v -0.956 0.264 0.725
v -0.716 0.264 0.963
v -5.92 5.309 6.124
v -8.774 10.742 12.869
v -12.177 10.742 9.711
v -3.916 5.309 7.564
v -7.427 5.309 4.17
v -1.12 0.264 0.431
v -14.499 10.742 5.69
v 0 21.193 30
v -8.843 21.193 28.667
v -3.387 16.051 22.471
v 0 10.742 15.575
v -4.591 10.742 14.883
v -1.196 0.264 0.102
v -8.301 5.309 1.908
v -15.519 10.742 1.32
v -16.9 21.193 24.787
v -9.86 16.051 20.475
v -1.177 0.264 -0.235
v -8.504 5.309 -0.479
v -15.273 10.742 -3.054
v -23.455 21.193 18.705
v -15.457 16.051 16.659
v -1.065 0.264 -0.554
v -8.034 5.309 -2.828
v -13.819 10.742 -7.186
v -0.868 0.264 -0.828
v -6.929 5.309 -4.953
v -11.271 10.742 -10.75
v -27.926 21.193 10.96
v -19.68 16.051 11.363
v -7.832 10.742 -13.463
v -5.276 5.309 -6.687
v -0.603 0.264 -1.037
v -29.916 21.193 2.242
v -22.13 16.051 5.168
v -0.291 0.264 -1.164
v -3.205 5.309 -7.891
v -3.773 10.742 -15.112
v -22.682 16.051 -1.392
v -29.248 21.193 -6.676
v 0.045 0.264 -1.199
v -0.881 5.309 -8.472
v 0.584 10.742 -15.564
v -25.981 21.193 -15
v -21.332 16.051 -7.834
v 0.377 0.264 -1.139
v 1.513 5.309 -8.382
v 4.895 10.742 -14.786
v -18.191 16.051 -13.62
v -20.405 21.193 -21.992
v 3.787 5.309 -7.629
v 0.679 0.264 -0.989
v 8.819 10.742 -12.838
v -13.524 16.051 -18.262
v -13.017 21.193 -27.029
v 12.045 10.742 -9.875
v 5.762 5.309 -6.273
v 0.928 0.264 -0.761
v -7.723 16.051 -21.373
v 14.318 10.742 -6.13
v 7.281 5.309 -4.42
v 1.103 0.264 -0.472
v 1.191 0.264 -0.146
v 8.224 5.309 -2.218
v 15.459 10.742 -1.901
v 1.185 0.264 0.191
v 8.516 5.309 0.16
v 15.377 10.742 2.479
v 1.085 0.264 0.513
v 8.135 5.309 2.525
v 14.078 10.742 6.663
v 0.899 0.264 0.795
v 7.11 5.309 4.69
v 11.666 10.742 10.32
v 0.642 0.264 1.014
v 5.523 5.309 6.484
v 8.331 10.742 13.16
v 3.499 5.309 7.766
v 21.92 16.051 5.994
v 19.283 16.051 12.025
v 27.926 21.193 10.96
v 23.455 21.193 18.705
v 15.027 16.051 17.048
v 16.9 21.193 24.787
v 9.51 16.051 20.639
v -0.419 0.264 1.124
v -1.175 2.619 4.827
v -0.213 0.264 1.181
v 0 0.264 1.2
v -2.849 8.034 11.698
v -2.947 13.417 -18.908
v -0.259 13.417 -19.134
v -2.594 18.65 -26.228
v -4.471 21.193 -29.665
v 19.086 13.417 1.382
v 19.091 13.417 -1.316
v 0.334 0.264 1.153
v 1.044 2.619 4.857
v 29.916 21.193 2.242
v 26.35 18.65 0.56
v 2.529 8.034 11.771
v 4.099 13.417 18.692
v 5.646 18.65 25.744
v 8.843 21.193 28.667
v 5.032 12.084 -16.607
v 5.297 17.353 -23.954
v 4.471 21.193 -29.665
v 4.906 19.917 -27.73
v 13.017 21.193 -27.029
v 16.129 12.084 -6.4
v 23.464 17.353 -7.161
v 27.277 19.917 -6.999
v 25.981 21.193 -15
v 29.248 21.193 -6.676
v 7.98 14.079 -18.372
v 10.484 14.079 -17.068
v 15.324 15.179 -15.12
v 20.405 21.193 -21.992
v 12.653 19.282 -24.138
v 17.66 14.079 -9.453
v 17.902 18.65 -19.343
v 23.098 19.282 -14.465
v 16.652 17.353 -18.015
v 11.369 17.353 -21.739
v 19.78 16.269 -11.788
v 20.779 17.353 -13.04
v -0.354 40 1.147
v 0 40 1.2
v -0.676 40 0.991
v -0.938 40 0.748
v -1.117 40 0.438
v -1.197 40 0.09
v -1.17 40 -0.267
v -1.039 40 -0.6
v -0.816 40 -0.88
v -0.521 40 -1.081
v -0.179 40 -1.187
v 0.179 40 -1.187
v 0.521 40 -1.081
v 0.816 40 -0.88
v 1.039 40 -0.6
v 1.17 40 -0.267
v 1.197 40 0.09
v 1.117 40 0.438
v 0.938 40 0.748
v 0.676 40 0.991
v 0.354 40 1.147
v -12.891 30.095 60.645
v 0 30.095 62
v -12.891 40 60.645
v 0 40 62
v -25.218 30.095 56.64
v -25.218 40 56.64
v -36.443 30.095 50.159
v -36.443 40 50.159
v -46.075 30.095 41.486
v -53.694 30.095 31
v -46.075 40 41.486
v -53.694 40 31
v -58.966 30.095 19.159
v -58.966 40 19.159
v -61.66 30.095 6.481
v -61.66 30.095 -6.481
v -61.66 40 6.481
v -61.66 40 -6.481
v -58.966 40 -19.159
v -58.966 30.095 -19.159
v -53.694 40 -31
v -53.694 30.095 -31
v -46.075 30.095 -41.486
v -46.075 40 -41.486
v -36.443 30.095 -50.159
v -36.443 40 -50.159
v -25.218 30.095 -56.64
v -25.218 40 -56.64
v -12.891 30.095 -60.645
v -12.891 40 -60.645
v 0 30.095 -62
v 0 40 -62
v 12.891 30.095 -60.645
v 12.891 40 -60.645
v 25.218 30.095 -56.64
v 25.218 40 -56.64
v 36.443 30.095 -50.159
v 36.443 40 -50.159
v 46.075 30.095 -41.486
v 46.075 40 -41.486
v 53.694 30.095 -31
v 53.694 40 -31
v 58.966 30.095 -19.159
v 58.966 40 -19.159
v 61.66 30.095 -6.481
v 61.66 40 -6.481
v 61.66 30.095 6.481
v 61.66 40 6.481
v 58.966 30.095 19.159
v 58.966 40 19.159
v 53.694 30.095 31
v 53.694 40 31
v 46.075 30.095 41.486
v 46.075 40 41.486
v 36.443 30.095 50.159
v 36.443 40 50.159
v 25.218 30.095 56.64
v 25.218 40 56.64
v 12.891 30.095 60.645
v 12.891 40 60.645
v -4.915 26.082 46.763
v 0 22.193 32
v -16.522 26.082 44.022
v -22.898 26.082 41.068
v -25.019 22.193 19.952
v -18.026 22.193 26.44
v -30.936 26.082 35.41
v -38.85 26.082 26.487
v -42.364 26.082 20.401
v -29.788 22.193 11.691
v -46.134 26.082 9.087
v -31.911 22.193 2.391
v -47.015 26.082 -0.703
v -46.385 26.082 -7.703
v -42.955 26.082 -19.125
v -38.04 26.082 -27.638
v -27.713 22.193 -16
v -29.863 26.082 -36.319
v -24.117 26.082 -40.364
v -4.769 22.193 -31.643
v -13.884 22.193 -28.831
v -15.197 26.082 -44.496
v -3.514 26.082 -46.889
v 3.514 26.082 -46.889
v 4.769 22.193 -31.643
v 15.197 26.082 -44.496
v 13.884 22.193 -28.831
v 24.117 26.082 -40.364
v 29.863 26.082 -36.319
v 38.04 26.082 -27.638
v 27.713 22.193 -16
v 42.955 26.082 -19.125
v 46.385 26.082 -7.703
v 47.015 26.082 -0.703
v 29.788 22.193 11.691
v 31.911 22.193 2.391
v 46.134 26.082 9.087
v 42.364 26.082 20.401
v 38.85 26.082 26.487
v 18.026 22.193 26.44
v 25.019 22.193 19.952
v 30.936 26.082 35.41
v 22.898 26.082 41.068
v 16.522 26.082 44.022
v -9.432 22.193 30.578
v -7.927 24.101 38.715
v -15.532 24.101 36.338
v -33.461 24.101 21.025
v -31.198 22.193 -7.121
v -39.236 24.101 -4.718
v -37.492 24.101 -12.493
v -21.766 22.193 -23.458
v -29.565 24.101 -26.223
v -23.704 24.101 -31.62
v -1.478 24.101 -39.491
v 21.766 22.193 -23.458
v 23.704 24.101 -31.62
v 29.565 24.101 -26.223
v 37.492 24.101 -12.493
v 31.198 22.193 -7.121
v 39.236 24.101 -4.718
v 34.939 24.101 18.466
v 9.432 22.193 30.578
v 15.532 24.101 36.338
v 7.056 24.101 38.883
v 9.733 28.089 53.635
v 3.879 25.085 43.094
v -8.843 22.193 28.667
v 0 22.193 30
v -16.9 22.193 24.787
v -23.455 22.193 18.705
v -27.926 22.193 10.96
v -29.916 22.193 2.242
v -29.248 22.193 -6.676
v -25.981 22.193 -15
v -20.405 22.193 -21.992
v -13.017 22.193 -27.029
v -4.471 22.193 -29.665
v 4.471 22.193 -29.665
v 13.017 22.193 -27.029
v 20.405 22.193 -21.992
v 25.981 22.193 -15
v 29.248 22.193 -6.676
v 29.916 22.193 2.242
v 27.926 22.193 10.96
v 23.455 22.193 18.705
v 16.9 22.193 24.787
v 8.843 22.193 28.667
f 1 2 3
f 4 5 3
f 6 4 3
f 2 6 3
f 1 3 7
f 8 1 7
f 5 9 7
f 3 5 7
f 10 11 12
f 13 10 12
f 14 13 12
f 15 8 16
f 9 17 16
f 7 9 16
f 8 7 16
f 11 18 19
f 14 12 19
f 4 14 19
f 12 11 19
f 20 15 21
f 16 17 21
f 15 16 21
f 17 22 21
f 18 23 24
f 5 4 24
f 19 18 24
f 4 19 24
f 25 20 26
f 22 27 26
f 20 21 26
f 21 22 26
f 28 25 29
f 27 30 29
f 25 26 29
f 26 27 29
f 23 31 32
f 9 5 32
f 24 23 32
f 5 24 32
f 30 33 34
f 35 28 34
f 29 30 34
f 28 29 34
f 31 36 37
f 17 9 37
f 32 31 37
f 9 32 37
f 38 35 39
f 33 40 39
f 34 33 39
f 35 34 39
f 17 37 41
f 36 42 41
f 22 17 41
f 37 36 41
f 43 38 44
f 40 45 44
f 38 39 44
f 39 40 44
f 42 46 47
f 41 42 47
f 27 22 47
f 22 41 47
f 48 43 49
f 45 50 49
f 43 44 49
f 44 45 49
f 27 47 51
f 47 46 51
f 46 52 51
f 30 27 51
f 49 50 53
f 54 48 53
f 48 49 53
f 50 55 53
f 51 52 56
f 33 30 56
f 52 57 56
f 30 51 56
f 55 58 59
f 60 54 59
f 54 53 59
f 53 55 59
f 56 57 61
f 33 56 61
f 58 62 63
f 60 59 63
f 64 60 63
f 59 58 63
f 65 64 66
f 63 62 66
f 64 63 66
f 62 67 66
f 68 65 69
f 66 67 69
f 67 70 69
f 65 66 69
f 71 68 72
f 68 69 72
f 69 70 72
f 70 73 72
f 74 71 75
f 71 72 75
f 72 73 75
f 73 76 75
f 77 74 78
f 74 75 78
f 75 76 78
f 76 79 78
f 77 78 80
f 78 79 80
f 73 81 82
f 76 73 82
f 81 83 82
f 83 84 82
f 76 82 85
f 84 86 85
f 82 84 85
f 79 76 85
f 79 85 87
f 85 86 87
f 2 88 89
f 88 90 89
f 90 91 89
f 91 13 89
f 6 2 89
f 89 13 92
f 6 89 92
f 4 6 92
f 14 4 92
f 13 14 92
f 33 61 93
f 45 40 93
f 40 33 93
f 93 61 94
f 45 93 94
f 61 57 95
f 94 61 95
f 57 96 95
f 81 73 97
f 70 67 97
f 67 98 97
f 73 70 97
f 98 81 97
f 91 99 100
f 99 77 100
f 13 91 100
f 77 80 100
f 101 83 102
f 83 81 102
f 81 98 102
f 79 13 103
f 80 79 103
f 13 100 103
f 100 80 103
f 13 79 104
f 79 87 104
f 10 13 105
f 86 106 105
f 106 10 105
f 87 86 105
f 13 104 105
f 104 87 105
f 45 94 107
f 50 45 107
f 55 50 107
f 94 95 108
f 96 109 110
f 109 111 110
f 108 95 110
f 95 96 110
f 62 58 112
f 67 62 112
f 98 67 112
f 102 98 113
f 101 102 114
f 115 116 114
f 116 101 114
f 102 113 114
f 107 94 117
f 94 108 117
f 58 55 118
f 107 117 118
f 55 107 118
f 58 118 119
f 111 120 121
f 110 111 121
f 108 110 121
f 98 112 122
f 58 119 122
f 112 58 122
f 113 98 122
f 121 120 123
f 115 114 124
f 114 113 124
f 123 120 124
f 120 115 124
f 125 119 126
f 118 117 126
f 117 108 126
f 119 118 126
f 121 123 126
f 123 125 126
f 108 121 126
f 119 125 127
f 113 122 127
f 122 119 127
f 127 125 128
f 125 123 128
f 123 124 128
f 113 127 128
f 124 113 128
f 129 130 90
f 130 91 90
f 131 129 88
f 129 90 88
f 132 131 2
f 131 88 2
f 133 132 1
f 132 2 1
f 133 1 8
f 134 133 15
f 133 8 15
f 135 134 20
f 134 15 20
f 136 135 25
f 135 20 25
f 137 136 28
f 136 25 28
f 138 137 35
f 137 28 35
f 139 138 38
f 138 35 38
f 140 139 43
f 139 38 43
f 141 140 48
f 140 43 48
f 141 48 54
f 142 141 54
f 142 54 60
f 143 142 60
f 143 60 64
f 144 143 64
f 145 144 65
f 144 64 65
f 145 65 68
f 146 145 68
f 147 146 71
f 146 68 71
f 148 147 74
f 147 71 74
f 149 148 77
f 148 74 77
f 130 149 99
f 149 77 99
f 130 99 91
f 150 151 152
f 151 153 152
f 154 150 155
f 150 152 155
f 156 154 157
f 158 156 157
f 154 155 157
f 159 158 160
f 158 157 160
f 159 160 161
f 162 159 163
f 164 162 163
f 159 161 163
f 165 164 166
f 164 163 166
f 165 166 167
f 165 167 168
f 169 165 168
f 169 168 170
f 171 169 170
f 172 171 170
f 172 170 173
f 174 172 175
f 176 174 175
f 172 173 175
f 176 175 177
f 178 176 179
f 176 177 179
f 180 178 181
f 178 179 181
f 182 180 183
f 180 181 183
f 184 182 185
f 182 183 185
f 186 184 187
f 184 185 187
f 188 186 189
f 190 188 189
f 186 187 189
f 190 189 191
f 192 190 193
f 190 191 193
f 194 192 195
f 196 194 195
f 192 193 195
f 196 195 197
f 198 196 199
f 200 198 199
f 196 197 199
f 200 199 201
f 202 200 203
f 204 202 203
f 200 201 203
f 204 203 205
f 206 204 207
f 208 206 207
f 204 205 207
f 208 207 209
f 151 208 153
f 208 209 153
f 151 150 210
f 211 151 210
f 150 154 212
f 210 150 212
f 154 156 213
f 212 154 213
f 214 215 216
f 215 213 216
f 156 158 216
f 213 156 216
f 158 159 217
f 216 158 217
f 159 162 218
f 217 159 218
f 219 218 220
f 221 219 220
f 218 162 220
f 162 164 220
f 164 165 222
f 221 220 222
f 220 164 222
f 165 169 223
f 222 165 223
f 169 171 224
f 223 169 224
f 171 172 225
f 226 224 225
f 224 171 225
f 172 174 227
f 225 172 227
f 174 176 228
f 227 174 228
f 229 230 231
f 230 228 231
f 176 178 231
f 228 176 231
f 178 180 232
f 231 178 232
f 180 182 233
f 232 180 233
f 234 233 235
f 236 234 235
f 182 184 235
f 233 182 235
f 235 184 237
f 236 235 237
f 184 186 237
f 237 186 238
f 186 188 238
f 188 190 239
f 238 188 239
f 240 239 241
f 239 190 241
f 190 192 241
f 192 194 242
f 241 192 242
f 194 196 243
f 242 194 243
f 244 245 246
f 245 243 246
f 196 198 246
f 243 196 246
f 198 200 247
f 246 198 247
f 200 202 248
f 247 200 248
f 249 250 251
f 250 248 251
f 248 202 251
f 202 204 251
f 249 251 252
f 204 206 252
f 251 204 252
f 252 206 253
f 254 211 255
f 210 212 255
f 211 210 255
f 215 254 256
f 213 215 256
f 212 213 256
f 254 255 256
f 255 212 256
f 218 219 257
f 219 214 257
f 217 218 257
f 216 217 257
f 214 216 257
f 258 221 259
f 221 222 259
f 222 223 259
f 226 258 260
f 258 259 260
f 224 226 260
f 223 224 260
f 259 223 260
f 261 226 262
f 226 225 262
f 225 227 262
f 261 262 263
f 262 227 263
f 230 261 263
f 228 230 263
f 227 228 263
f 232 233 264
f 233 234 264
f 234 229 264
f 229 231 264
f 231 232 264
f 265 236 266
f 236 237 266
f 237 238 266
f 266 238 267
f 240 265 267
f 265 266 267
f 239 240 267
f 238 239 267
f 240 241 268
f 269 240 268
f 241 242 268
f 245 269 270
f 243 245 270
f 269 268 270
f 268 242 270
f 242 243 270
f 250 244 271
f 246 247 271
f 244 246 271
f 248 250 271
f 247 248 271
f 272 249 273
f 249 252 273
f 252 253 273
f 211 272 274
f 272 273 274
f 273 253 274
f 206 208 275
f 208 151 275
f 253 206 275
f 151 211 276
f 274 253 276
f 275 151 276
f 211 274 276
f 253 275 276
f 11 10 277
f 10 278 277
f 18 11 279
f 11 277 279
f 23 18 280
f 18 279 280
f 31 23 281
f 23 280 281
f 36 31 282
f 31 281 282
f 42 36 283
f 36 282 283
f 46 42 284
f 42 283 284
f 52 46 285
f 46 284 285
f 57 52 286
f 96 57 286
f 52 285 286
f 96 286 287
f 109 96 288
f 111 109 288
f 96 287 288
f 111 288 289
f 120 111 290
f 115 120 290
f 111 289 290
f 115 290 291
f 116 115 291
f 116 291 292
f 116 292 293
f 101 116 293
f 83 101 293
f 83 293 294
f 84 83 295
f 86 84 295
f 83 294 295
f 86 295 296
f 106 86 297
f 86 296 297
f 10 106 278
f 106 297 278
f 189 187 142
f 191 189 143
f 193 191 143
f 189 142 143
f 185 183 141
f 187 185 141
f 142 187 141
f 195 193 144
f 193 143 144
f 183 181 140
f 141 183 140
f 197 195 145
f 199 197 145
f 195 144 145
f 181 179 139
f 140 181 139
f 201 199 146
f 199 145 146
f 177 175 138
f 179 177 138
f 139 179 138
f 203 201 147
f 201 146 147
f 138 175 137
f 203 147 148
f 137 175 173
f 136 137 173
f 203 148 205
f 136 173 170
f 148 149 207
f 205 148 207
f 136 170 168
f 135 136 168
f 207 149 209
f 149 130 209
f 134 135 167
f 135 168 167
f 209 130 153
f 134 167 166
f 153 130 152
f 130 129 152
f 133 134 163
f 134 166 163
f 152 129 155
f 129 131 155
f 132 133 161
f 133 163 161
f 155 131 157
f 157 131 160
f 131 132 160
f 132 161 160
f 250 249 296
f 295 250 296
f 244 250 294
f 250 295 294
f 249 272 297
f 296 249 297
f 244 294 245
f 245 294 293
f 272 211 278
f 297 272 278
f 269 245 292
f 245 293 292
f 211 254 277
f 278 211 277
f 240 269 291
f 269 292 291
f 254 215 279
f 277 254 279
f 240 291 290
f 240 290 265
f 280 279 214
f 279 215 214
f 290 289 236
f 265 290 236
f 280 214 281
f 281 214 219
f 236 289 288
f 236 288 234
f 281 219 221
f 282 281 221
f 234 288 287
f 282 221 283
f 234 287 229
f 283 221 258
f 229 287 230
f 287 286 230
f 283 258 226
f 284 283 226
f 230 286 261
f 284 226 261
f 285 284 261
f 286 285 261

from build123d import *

# Parameters (mm, degrees)
SKETCH5_R          = 1.2
CUT_EXTRUDE1_DEPTH = 97.374391836


with BuildPart() as part:
    # Sketch3 → Revolve4 (revolve)
    with BuildSketch(Plane.XY, mode=Mode.PRIVATE) as revolve4_sk:
        with BuildLine():
            Line((1.2, 40), (1.2, 35))
            Line((1.2, 35), (0, 35))
            Line((0, 35), (0, 0))
            add(Edge.make_bspline(
                [(0, 0), (0.016019319, -0.000318055), (0.047363957, -0.000435511), (0.124565155, 0.000266609), (0.188009448, 0.004784889), (0.302162397, 0.014312965), (0.434906427, 0.033705318), (0.591621889, 0.064644454), (0.758367433, 0.108988084), (0.948542262, 0.167874068), (1.148421918, 0.240807637), (1.371995113, 0.333716386), (1.616332852, 0.447951628), (1.849490673, 0.566207637), (2.087888718, 0.695473704), (2.332059128, 0.835246826), (2.58184161, 0.985088882), (2.837525433, 1.144500635), (3.280910816, 1.429940425), (3.987203031, 1.90885241), (4.782895287, 2.47902437), (5.670177955, 3.135768142), (6.952119682, 4.102593634), (8.54259141, 5.325845847), (10.604195933, 6.925596943), (12.826583422, 8.642993281), (14.739325068, 10.108026887), (16.656080522, 11.562834877), (18.263641211, 12.770152933), (19.86943126, 13.963247261), (21.49455733, 15.156400303), (22.779497329, 16.09234009), (24.104955514, 17.047574491), (25.371752363, 17.954092797), (27.088904748, 19.168461977), (28.252901787, 19.98540612), (29.449304391, 20.812459503), (30, 21.192600657)],
                knots=[0.083228293, 0.083228293, 0.083228293, 0.083228293, 0.083228293, 0.084966808, 0.086705324, 0.088443839, 0.090182354, 0.094715982, 0.099249609, 0.102595877, 0.105942145, 0.11263468, 0.118542035, 0.12444939, 0.130356745, 0.1362641, 0.143077266, 0.149890431, 0.156703596, 0.163516762, 0.190769423, 0.227072871, 0.245224595, 0.263376319, 0.335983216, 0.408590105, 0.481196988, 0.517500433, 0.553803878, 0.62641076, 0.662714204, 0.699017649, 0.73532109, 0.77162453, 0.807927974, 0.844231418, 0.916838297, 0.916838297, 0.916838297, 0.916838297, 0.916838297], degree=4))
            Line((30, 21.192600657), (30, 22.192600657))
            Line((30, 22.192600657), (32, 22.192600657))
            add(Edge.make_bspline(
                [(32, 22.192600657), (32.162915702, 22.232666844), (32.488958654, 22.313115116), (33.263212157, 22.504689633), (33.899427502, 22.664143218), (34.764531294, 22.881239955), (35.599919047, 23.093016172), (36.60770971, 23.349566353), (37.666018765, 23.621449645), (38.842336337, 23.925372583), (40.008709056, 24.228933497), (41.277930329, 24.560859252), (42.855461777, 24.975889041), (44.685765864, 25.460096251), (46.877858703, 26.043480312), (49.138952662, 26.647832786), (51.578771091, 27.301669511), (53.733375607, 27.880212163), (56.351738039, 28.582694255), (58.206860039, 29.080808988), (60.542454551, 29.705648226), (61.51372473, 29.965262734), (62, 30.095100636)],
                knots=[0.083003414, 0.083003414, 0.083003414, 0.083003414, 0.083003414, 0.104634508, 0.126265607, 0.147896704, 0.1695278, 0.191650914, 0.224097561, 0.256544207, 0.288990852, 0.3214375, 0.353884145, 0.398191873, 0.463085165, 0.527978458, 0.59287175, 0.657765042, 0.722658334, 0.787551626, 0.852444918, 0.91733821, 0.91733821, 0.91733821, 0.91733821, 0.91733821], degree=4))
            Line((62, 30.095100636), (62, 40))
            Line((62, 40), (1.2, 40))
        make_face()
    revolve(revolve4_sk.sketch.rotate(Axis((0, 40, 0), (0, -1, 0)), 90), axis=Axis((0, 40, 0), (0, -1, 0)))

    # Sketch5 → Cut-Extrude1 (cut, through all)
    with BuildSketch(Plane(origin=(0, 40, 0), x_dir=(1, 0, 0), z_dir=(0, 1, 0))):
        with Locations(Location((0, 0, 0), (0, 0, 270))):
            Circle(SKETCH5_R)
    extrude(amount=-CUT_EXTRUDE1_DEPTH, mode=Mode.SUBTRACT)


solid = part.part
